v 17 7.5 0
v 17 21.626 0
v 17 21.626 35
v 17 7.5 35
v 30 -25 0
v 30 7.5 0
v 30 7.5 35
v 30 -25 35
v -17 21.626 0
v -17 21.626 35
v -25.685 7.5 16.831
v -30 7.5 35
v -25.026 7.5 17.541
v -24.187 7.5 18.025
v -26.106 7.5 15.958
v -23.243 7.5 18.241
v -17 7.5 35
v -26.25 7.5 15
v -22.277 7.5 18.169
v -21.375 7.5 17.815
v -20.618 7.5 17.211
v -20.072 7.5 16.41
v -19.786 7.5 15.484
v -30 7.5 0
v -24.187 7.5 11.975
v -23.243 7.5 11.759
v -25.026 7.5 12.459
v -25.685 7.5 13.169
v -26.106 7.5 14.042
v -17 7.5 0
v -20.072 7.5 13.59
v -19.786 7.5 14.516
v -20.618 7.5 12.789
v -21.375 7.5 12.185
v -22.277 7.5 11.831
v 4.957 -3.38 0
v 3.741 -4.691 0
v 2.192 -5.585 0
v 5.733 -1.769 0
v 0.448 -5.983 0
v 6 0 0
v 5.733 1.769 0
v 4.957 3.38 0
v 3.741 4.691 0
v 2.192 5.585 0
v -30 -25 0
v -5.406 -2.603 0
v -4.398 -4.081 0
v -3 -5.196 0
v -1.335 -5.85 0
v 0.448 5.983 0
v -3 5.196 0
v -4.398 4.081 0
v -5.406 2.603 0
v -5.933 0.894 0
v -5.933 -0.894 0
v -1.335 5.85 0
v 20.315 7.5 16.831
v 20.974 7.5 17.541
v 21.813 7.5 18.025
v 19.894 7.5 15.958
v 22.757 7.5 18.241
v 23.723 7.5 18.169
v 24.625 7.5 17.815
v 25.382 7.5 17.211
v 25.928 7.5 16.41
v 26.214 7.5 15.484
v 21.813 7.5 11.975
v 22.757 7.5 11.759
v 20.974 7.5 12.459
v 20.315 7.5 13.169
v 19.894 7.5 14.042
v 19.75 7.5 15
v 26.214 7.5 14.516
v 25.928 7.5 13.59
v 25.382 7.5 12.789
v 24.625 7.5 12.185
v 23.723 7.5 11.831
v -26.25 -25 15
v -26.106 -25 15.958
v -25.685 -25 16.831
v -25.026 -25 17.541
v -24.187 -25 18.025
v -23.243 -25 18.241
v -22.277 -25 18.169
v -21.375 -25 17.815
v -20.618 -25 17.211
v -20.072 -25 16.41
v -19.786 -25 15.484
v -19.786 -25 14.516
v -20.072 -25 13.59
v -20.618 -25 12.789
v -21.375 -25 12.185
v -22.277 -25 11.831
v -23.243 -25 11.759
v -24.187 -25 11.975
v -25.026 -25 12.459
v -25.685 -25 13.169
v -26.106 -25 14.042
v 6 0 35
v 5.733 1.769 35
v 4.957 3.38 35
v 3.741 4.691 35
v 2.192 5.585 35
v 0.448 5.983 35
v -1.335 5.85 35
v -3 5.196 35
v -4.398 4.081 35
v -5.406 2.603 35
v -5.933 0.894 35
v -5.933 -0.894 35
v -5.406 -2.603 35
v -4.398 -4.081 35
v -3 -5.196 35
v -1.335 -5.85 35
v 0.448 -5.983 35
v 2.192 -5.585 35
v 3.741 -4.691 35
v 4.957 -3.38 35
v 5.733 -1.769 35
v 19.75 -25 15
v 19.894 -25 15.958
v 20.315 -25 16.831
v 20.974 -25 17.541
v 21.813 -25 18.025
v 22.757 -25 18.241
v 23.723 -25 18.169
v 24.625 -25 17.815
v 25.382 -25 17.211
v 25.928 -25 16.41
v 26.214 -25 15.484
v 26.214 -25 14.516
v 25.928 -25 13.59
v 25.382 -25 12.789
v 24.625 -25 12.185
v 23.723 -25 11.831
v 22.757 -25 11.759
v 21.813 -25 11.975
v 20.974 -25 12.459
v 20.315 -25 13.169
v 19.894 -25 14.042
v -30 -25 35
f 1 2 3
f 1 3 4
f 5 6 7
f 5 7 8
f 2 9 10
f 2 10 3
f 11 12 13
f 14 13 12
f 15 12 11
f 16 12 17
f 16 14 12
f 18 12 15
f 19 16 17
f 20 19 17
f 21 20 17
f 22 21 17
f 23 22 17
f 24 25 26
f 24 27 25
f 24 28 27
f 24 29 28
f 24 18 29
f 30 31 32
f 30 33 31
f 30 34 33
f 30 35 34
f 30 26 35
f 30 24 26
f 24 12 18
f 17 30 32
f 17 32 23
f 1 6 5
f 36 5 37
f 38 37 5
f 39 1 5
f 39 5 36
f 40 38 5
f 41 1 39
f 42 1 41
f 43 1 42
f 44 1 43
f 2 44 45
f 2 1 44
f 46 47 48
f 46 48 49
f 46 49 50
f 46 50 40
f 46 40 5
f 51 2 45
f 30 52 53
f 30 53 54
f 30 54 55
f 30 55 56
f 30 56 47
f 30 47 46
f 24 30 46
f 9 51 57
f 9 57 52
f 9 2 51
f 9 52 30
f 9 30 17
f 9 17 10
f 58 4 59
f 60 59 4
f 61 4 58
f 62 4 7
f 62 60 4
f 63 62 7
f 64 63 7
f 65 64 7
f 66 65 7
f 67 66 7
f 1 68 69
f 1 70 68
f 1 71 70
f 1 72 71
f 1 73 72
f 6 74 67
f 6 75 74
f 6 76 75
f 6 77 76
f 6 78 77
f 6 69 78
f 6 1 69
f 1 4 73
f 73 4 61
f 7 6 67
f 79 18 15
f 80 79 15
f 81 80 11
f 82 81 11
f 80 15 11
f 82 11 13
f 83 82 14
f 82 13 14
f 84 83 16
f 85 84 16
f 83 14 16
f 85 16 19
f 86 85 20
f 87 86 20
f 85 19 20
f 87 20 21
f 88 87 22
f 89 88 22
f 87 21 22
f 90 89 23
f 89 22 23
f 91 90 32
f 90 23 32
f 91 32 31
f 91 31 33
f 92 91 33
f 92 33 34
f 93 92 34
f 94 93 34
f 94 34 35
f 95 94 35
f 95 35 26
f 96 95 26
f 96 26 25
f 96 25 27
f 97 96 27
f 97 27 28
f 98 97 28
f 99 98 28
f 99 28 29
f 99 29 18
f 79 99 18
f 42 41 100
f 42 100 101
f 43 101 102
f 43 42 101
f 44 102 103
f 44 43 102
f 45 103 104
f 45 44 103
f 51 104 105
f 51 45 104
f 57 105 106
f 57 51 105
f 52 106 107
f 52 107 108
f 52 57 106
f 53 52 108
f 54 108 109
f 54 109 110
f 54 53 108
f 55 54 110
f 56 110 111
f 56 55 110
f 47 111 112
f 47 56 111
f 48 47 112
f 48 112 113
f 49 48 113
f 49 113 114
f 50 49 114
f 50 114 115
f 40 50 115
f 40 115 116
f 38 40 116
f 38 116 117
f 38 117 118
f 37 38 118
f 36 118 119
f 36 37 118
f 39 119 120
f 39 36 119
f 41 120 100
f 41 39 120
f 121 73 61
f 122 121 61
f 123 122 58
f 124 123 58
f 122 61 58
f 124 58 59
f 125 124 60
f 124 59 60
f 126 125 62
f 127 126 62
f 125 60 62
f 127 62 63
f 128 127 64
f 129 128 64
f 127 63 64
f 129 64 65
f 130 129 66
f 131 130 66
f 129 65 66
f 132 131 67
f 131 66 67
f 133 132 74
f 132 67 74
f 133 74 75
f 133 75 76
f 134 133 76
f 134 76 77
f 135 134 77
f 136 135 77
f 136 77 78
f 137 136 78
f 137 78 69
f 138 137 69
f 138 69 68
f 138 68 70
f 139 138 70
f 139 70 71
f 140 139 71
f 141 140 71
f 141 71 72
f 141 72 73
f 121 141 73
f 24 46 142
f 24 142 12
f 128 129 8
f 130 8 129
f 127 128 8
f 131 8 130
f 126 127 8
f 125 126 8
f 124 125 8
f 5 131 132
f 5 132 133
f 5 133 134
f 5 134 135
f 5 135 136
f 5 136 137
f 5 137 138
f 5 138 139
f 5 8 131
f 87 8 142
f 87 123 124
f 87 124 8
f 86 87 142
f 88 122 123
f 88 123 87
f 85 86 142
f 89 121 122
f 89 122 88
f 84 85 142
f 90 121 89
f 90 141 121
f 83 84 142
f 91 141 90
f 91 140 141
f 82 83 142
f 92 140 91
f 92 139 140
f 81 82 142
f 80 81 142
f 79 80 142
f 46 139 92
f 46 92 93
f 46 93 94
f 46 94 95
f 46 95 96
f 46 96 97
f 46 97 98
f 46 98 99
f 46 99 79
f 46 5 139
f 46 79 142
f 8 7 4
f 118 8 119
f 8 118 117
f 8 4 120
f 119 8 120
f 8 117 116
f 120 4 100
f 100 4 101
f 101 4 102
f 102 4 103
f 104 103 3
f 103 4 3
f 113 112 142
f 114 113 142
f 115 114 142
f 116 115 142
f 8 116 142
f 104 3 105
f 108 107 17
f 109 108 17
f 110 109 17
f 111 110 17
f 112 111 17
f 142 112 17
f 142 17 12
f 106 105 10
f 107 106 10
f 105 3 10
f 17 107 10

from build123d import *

# Parameters (mm, degrees)
SKETCH_R     = 6
PAD_DEPTH    = 35
SKETCH001_R  = 3.25
POCKET_DEPTH = 32.501


with BuildPart() as part:
    # Sketch → Pad (new body)
    with BuildSketch(Plane.XY):
        Polygon((-17, 21.625642), (17, 21.625642), (17, 7.5), (30, 7.5), (30, -25), (-30, -25), (-30, 7.5), (-17, 7.5), align=None)
        Circle(SKETCH_R, mode=Mode.SUBTRACT)
    extrude(amount=PAD_DEPTH)

    # Sketch001 (on Face7 of Pad) → Pocket (cut, through all)
    with BuildSketch(Plane(origin=(0, 7.5, 0), x_dir=(-1, 0, 0), z_dir=(0, 1, 0))):
        with Locations((-23, 15)):
            Circle(SKETCH001_R)
        with Locations((23, 15)):
            Circle(SKETCH001_R)
    extrude(amount=-POCKET_DEPTH, mode=Mode.SUBTRACT)


solid = part.part
